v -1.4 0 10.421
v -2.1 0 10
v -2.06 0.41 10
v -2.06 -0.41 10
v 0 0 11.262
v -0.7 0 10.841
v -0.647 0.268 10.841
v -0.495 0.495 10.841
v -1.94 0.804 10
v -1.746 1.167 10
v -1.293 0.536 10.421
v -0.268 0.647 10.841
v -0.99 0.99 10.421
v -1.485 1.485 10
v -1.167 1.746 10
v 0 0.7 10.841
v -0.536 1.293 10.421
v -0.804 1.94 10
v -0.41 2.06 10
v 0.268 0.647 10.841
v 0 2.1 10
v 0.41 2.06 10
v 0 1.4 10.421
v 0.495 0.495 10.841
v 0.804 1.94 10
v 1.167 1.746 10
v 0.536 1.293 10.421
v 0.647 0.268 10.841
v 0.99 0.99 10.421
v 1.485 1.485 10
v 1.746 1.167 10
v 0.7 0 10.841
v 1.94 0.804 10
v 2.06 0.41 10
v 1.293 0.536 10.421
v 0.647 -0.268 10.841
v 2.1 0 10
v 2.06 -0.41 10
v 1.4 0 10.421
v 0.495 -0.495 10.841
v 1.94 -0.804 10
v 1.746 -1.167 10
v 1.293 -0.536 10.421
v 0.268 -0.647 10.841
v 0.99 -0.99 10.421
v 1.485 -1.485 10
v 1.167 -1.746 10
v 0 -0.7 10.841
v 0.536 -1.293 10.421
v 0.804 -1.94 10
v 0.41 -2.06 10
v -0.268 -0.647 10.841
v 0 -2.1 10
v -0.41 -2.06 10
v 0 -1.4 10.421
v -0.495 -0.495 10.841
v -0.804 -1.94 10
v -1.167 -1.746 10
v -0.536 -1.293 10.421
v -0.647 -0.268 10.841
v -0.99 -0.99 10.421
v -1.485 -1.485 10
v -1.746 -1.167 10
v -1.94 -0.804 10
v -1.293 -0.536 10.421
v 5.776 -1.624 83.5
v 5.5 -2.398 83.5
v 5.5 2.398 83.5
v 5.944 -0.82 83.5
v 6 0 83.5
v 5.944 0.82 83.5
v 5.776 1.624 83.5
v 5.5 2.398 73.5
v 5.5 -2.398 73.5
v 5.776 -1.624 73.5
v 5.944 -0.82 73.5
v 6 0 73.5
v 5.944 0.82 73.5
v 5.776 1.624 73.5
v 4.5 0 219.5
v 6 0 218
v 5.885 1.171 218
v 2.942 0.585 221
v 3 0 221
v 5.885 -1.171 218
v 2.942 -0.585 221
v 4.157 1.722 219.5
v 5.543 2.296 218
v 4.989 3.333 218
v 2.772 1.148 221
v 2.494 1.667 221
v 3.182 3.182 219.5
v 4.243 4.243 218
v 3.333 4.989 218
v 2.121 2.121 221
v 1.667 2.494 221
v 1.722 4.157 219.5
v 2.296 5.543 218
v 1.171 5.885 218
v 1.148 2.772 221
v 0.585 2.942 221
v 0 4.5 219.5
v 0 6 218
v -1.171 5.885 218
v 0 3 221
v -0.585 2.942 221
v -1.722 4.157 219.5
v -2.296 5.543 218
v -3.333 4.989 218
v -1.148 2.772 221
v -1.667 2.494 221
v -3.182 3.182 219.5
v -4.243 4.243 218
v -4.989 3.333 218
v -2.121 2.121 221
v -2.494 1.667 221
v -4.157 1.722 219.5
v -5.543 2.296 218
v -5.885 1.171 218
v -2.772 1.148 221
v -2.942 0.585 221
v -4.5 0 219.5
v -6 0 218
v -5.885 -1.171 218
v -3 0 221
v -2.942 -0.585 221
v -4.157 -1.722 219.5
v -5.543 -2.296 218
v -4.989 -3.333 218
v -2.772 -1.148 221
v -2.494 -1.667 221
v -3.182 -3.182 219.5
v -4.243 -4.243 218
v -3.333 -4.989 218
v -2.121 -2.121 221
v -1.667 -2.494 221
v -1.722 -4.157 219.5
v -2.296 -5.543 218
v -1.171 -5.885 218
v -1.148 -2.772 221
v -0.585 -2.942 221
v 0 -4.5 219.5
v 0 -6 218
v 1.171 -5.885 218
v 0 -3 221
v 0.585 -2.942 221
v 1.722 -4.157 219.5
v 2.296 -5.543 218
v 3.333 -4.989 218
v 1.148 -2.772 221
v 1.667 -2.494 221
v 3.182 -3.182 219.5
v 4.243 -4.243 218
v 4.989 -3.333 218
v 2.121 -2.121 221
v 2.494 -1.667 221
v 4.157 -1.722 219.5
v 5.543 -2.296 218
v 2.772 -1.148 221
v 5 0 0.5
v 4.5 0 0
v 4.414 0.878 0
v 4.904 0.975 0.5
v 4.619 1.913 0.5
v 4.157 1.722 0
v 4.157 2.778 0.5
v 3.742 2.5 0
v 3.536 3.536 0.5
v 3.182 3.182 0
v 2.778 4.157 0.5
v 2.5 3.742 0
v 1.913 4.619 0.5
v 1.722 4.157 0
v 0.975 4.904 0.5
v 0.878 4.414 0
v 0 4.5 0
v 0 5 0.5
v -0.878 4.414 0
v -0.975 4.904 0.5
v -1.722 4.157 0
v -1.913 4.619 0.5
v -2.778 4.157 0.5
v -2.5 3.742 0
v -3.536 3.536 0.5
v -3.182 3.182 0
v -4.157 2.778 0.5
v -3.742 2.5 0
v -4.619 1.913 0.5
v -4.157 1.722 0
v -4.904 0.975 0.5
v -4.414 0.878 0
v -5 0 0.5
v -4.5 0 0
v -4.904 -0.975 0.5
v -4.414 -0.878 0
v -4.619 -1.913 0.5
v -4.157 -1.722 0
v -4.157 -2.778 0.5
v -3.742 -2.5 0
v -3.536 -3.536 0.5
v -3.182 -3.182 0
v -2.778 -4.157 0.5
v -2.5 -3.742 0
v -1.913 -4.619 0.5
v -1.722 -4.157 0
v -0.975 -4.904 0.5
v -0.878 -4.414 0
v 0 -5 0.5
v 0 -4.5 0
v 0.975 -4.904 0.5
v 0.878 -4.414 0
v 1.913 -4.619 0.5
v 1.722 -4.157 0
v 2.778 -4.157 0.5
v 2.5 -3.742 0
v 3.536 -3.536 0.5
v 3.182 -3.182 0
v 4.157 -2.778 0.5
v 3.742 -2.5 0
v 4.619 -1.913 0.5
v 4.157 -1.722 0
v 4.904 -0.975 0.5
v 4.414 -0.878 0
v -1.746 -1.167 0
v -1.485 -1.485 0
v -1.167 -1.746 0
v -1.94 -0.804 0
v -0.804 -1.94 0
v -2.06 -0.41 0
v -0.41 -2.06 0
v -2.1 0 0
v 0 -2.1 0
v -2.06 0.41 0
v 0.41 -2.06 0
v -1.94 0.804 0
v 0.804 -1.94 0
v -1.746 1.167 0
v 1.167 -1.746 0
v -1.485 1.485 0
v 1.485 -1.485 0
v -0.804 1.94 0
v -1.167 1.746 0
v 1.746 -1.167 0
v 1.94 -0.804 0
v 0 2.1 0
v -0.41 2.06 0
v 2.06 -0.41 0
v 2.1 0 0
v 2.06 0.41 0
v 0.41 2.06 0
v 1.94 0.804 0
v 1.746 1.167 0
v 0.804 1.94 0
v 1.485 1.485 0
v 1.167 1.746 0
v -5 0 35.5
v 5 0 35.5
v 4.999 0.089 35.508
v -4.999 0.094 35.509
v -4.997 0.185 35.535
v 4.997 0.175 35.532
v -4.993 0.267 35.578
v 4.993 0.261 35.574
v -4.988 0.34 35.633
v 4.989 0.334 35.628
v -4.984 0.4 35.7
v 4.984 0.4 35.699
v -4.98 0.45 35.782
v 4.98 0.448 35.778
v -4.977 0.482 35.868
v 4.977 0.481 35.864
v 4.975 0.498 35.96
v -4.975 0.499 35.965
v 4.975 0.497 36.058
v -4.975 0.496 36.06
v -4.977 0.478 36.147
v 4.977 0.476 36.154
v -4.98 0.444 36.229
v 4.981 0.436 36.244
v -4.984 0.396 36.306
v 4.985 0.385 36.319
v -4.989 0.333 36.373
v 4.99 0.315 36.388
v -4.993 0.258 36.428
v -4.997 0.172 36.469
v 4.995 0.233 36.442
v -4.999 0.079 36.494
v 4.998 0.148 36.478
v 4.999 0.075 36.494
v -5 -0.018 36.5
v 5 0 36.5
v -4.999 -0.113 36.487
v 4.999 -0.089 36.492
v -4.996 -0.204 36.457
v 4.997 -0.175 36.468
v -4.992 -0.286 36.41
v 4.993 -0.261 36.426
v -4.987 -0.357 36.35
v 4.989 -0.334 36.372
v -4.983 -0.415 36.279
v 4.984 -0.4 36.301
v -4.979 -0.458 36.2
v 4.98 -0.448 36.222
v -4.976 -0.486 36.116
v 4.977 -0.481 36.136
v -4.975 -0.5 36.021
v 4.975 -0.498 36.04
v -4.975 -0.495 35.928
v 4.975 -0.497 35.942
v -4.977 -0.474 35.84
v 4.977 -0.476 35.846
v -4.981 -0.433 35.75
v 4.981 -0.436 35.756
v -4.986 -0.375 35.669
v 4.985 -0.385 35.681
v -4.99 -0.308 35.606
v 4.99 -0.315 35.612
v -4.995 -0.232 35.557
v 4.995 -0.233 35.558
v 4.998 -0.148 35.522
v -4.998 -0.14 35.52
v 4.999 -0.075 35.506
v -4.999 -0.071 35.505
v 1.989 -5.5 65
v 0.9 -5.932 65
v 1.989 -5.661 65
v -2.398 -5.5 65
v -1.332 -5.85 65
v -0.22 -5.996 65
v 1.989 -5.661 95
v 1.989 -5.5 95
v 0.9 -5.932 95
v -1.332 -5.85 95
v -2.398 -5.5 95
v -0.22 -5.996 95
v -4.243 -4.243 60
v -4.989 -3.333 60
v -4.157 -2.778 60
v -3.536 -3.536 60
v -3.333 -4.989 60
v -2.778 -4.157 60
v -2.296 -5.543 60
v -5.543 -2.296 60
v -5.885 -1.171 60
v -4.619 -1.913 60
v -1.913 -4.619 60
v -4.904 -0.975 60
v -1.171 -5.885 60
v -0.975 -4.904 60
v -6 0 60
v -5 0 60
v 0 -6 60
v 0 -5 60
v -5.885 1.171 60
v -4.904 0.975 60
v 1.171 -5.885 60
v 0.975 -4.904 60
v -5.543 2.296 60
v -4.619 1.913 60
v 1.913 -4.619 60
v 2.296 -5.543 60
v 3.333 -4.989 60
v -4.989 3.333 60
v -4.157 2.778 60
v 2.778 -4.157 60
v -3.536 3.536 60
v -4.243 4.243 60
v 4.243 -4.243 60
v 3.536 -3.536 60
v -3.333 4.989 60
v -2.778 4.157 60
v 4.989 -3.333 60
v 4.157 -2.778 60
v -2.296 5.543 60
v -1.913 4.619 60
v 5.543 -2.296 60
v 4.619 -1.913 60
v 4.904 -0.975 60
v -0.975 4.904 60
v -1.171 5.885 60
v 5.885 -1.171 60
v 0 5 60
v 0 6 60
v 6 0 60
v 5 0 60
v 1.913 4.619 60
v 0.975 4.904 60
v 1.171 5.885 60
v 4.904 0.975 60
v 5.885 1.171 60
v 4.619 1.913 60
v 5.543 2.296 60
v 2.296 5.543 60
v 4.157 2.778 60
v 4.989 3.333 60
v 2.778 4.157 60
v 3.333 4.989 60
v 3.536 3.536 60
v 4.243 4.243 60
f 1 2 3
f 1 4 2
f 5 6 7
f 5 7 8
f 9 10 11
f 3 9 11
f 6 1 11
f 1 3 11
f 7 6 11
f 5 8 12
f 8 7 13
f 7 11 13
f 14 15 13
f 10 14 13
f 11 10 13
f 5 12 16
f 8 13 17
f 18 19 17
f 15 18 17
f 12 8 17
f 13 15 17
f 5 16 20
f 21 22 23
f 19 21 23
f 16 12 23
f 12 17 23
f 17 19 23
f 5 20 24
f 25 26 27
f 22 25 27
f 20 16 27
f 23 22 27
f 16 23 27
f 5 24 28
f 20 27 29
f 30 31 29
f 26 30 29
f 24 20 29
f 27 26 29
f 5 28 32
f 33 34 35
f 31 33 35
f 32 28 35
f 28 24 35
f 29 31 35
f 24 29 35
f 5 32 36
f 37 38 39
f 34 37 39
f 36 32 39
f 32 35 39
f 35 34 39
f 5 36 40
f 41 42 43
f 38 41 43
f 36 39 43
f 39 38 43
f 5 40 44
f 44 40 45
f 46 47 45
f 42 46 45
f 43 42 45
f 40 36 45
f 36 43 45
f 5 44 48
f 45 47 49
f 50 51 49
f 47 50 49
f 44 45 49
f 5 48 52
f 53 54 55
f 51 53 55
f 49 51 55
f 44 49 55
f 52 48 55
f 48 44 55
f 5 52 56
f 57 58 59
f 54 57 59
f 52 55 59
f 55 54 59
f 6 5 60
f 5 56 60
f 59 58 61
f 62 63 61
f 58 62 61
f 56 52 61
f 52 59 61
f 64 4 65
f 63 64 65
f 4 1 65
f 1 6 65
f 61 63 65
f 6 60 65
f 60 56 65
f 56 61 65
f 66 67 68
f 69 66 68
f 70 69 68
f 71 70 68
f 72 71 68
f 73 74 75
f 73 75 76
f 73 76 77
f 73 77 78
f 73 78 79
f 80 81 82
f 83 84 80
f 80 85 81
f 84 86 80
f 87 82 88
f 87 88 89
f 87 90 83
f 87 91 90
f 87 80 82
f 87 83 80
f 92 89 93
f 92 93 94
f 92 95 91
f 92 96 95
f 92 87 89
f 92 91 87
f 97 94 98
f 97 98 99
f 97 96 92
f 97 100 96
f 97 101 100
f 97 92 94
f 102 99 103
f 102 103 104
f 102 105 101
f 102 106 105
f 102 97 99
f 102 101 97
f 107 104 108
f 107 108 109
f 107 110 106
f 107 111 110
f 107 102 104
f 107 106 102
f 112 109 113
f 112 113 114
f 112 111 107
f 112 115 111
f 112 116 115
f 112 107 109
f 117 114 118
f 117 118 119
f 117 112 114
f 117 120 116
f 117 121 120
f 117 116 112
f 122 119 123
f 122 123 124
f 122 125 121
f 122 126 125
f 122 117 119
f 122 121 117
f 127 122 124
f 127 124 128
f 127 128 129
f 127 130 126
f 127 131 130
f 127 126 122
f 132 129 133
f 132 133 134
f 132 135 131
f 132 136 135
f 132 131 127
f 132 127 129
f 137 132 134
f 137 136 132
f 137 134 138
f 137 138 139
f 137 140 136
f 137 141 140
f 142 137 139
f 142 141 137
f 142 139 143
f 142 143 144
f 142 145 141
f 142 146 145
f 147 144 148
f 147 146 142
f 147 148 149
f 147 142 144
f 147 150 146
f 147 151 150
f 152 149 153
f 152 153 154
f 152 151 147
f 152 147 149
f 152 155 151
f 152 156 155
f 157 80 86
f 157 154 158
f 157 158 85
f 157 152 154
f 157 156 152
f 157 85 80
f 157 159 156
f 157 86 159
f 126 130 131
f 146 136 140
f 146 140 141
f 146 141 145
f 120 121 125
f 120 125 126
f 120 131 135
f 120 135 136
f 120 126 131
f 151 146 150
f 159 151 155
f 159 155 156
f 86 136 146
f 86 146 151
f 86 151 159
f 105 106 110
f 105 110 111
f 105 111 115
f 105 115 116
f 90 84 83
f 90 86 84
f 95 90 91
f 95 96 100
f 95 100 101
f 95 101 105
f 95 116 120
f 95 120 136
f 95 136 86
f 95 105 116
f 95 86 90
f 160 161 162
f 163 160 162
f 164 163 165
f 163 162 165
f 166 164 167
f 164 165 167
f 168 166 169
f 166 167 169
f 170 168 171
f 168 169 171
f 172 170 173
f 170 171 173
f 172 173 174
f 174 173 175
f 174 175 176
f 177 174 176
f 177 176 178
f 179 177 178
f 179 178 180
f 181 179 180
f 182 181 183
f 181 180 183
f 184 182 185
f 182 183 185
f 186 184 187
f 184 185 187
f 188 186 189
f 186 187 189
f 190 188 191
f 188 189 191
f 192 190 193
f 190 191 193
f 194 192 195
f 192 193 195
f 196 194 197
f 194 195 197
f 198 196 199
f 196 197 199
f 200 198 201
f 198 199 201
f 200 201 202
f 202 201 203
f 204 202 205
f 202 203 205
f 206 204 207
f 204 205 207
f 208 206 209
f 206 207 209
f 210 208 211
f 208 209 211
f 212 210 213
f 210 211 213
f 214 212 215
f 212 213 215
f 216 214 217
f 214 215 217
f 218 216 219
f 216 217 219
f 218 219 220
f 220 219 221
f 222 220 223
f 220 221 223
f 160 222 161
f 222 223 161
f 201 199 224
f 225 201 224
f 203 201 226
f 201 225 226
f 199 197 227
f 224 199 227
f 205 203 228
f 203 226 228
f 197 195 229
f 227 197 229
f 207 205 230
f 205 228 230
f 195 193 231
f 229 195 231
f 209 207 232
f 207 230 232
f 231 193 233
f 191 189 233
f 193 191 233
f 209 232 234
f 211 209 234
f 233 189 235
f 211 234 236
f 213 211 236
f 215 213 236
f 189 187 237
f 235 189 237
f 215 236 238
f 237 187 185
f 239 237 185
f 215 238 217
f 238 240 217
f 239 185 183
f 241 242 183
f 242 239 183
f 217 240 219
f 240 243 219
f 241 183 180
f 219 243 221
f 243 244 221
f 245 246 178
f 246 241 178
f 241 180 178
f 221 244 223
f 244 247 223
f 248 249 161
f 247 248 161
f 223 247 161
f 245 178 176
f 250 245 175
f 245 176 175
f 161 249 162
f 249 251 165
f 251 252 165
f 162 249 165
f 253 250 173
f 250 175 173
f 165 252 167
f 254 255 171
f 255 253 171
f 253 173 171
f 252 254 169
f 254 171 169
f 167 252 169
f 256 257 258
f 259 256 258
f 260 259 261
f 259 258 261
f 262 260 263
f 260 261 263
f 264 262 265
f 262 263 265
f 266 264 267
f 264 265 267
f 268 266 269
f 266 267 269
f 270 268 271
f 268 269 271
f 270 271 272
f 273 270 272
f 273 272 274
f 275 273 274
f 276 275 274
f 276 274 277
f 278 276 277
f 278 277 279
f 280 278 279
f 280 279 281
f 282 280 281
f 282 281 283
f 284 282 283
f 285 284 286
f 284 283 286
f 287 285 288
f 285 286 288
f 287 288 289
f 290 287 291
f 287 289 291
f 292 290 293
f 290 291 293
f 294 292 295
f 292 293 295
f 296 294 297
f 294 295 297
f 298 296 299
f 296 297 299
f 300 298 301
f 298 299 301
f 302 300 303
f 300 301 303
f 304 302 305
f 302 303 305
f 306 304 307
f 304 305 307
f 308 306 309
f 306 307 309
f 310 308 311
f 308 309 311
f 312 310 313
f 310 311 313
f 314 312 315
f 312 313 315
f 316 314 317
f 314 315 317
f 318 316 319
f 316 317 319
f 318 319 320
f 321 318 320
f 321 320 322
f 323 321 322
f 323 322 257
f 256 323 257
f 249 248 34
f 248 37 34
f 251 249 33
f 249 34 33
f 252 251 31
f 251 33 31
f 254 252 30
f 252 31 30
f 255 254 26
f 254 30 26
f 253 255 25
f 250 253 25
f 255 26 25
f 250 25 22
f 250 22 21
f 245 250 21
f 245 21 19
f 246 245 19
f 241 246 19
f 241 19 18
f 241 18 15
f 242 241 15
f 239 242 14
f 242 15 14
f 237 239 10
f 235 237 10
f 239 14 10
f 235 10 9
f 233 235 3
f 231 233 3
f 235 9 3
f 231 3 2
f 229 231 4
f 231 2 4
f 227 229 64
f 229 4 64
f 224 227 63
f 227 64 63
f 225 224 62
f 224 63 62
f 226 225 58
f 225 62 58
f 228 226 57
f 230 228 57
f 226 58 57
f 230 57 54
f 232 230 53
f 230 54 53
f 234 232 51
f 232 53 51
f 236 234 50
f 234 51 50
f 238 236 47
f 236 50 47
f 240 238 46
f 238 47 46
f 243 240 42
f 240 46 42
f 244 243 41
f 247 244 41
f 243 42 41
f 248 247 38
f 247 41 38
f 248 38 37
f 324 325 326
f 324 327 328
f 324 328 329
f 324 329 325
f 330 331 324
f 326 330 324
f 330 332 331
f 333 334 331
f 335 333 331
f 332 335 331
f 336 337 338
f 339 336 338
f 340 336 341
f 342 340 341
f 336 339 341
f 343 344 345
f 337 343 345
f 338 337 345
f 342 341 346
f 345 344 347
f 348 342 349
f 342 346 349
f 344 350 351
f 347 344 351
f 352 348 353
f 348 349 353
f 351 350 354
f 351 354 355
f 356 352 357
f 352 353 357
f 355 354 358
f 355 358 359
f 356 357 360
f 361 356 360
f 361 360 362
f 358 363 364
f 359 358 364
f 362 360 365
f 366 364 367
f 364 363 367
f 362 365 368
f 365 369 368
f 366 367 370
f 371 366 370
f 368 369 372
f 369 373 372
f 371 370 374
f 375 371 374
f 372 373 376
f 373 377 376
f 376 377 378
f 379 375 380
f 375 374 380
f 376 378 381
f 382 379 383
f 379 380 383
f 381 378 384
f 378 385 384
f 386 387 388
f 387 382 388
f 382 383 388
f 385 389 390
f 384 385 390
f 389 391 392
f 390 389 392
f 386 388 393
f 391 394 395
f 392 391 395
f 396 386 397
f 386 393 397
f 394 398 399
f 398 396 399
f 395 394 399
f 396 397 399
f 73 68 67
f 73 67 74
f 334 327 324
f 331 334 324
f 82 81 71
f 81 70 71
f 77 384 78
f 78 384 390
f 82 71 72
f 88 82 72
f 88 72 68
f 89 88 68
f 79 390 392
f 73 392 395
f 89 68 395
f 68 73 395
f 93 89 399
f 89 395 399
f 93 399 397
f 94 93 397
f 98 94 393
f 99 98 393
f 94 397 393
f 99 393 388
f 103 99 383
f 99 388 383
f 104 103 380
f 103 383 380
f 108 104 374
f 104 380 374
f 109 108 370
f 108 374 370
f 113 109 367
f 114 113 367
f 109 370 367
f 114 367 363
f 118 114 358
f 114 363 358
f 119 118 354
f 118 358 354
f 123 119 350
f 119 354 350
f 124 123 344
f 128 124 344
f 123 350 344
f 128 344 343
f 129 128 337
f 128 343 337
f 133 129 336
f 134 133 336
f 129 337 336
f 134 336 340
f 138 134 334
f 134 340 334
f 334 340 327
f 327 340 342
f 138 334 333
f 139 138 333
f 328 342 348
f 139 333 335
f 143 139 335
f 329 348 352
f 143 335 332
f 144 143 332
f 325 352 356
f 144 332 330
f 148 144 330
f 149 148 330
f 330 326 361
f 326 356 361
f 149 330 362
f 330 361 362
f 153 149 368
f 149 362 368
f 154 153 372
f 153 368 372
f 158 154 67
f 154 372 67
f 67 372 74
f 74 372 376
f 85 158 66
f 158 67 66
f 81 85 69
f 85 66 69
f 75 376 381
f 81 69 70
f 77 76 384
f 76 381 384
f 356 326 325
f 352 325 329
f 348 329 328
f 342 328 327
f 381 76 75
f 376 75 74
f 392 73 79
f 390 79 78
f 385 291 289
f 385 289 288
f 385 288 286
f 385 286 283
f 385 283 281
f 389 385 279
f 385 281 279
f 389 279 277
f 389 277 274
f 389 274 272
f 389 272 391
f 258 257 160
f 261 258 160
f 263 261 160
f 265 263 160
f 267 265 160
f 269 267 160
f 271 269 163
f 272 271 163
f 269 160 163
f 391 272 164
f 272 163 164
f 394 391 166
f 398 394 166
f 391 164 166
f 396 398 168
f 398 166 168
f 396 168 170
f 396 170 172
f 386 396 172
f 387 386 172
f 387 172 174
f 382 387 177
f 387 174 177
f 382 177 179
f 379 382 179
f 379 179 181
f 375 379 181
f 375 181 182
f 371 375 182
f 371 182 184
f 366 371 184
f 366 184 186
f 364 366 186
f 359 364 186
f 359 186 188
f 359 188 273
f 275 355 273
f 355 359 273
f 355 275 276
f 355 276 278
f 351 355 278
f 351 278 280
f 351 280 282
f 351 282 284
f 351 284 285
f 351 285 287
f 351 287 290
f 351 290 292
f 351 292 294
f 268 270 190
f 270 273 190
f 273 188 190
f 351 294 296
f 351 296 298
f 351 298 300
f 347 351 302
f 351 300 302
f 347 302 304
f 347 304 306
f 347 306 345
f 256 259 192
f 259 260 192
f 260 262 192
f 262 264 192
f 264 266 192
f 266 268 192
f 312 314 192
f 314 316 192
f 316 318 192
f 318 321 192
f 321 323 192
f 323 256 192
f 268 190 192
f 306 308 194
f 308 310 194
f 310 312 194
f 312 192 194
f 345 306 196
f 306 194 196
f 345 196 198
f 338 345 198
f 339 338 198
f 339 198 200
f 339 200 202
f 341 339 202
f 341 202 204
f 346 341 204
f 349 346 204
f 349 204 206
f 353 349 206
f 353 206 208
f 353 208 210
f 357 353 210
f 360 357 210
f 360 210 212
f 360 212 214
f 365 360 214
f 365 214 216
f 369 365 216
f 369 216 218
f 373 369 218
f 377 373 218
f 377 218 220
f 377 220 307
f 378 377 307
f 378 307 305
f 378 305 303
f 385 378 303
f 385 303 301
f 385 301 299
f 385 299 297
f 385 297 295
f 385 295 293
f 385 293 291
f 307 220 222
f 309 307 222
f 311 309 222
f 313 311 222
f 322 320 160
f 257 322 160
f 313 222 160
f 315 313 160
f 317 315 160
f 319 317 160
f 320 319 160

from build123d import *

# Parameters (mm, degrees)
SKETCH1_R               = 5
BOSS_EXTRUDE1_DEPTH     = 60
SKETCH2_R               = 6
BOSS_EXTRUDE2_DEPTH     = 161
SKETCH3_R               = 0.5
CUT_EXTRUDE1_DEPTH      = 1.5
CUT_EXTRUDE1_DEPTH_BACK = 12.5
SKETCH4_W               = 10
SKETCH4_H               = 4.936159812
CUT_EXTRUDE2_DEPTH      = 1.5
M5_TAPPED_HOLE1_D       = 4.2
M5_TAPPED_HOLE1_DEPTH   = 10
M5_TAPPED_HOLE1_TIP     = 1.2618073
CHAMFER1_SIZE           = 3
CHAMFER2_SIZE           = 0.5
SKETCH8_W               = 5
SKETCH8_H               = 30
CUT_EXTRUDE3_DEPTH      = 161


with BuildPart() as part:
    # Sketch1 → Boss-Extrude1 (new body)
    with BuildSketch(Plane.XY):
        Circle(SKETCH1_R)
    extrude(amount=BOSS_EXTRUDE1_DEPTH)

    # Sketch2 → Boss-Extrude2 (add)
    with BuildSketch(Plane.XY.offset(60)):
        Circle(SKETCH2_R)
    extrude(amount=BOSS_EXTRUDE2_DEPTH)

    # Sketch3 → Cut-Extrude1 (cut, two sides)
    with BuildSketch(Plane(origin=(5.5, 0, 0), x_dir=(0, 0, -1), z_dir=(1, 0, 0))) as cut_extrude1_sk:
        with Locations((-36, 0)):
            Circle(SKETCH3_R)
    extrude(amount=CUT_EXTRUDE1_DEPTH, mode=Mode.SUBTRACT)
    extrude(cut_extrude1_sk.sketch, amount=-CUT_EXTRUDE1_DEPTH_BACK, mode=Mode.SUBTRACT)

    # Sketch4 → Cut-Extrude2 (cut, through all)
    with BuildSketch(Plane(origin=(5.5, 0, 0), x_dir=(0, 0, -1), z_dir=(1, 0, 0))):
        with Locations((-78.5, 0)):
            Rectangle(SKETCH4_W, SKETCH4_H)
    extrude(amount=CUT_EXTRUDE2_DEPTH, mode=Mode.SUBTRACT)

    # M5 Tapped Hole1
    with Locations(Plane(origin=(0, 0, 0), x_dir=(-1, 0, 0), z_dir=(0, 0, -1))):
        with Locations((0, 0)):
            Hole(M5_TAPPED_HOLE1_D / 2, depth=M5_TAPPED_HOLE1_DEPTH)
            with Locations((0, 0, -(M5_TAPPED_HOLE1_DEPTH + M5_TAPPED_HOLE1_TIP / 2))):  # 118° drill point
                Cone(0, M5_TAPPED_HOLE1_D / 2, M5_TAPPED_HOLE1_TIP, mode=Mode.SUBTRACT)

    # Chamfer1
    chamfer1_edges = [part.edges().sort_by_distance(p)[0] for p in [
        (-6, 0, 221),
    ]]
    chamfer(chamfer1_edges, length=CHAMFER1_SIZE)

    # Chamfer2
    chamfer2_edges = [part.edges().sort_by_distance(p)[0] for p in [
        (-5, 0, 0),
    ]]
    chamfer(chamfer2_edges, length=CHAMFER2_SIZE)

    # Sketch8 → Cut-Extrude3 (cut)
    with BuildSketch(Plane(origin=(0, -5.5, 0), x_dir=(1, 0, 0), z_dir=(0, 1, 0))):
        with Locations((-0.510877728, -80)):
            Rectangle(SKETCH8_W, SKETCH8_H)
    extrude(amount=-CUT_EXTRUDE3_DEPTH, mode=Mode.SUBTRACT)


solid = part.part
